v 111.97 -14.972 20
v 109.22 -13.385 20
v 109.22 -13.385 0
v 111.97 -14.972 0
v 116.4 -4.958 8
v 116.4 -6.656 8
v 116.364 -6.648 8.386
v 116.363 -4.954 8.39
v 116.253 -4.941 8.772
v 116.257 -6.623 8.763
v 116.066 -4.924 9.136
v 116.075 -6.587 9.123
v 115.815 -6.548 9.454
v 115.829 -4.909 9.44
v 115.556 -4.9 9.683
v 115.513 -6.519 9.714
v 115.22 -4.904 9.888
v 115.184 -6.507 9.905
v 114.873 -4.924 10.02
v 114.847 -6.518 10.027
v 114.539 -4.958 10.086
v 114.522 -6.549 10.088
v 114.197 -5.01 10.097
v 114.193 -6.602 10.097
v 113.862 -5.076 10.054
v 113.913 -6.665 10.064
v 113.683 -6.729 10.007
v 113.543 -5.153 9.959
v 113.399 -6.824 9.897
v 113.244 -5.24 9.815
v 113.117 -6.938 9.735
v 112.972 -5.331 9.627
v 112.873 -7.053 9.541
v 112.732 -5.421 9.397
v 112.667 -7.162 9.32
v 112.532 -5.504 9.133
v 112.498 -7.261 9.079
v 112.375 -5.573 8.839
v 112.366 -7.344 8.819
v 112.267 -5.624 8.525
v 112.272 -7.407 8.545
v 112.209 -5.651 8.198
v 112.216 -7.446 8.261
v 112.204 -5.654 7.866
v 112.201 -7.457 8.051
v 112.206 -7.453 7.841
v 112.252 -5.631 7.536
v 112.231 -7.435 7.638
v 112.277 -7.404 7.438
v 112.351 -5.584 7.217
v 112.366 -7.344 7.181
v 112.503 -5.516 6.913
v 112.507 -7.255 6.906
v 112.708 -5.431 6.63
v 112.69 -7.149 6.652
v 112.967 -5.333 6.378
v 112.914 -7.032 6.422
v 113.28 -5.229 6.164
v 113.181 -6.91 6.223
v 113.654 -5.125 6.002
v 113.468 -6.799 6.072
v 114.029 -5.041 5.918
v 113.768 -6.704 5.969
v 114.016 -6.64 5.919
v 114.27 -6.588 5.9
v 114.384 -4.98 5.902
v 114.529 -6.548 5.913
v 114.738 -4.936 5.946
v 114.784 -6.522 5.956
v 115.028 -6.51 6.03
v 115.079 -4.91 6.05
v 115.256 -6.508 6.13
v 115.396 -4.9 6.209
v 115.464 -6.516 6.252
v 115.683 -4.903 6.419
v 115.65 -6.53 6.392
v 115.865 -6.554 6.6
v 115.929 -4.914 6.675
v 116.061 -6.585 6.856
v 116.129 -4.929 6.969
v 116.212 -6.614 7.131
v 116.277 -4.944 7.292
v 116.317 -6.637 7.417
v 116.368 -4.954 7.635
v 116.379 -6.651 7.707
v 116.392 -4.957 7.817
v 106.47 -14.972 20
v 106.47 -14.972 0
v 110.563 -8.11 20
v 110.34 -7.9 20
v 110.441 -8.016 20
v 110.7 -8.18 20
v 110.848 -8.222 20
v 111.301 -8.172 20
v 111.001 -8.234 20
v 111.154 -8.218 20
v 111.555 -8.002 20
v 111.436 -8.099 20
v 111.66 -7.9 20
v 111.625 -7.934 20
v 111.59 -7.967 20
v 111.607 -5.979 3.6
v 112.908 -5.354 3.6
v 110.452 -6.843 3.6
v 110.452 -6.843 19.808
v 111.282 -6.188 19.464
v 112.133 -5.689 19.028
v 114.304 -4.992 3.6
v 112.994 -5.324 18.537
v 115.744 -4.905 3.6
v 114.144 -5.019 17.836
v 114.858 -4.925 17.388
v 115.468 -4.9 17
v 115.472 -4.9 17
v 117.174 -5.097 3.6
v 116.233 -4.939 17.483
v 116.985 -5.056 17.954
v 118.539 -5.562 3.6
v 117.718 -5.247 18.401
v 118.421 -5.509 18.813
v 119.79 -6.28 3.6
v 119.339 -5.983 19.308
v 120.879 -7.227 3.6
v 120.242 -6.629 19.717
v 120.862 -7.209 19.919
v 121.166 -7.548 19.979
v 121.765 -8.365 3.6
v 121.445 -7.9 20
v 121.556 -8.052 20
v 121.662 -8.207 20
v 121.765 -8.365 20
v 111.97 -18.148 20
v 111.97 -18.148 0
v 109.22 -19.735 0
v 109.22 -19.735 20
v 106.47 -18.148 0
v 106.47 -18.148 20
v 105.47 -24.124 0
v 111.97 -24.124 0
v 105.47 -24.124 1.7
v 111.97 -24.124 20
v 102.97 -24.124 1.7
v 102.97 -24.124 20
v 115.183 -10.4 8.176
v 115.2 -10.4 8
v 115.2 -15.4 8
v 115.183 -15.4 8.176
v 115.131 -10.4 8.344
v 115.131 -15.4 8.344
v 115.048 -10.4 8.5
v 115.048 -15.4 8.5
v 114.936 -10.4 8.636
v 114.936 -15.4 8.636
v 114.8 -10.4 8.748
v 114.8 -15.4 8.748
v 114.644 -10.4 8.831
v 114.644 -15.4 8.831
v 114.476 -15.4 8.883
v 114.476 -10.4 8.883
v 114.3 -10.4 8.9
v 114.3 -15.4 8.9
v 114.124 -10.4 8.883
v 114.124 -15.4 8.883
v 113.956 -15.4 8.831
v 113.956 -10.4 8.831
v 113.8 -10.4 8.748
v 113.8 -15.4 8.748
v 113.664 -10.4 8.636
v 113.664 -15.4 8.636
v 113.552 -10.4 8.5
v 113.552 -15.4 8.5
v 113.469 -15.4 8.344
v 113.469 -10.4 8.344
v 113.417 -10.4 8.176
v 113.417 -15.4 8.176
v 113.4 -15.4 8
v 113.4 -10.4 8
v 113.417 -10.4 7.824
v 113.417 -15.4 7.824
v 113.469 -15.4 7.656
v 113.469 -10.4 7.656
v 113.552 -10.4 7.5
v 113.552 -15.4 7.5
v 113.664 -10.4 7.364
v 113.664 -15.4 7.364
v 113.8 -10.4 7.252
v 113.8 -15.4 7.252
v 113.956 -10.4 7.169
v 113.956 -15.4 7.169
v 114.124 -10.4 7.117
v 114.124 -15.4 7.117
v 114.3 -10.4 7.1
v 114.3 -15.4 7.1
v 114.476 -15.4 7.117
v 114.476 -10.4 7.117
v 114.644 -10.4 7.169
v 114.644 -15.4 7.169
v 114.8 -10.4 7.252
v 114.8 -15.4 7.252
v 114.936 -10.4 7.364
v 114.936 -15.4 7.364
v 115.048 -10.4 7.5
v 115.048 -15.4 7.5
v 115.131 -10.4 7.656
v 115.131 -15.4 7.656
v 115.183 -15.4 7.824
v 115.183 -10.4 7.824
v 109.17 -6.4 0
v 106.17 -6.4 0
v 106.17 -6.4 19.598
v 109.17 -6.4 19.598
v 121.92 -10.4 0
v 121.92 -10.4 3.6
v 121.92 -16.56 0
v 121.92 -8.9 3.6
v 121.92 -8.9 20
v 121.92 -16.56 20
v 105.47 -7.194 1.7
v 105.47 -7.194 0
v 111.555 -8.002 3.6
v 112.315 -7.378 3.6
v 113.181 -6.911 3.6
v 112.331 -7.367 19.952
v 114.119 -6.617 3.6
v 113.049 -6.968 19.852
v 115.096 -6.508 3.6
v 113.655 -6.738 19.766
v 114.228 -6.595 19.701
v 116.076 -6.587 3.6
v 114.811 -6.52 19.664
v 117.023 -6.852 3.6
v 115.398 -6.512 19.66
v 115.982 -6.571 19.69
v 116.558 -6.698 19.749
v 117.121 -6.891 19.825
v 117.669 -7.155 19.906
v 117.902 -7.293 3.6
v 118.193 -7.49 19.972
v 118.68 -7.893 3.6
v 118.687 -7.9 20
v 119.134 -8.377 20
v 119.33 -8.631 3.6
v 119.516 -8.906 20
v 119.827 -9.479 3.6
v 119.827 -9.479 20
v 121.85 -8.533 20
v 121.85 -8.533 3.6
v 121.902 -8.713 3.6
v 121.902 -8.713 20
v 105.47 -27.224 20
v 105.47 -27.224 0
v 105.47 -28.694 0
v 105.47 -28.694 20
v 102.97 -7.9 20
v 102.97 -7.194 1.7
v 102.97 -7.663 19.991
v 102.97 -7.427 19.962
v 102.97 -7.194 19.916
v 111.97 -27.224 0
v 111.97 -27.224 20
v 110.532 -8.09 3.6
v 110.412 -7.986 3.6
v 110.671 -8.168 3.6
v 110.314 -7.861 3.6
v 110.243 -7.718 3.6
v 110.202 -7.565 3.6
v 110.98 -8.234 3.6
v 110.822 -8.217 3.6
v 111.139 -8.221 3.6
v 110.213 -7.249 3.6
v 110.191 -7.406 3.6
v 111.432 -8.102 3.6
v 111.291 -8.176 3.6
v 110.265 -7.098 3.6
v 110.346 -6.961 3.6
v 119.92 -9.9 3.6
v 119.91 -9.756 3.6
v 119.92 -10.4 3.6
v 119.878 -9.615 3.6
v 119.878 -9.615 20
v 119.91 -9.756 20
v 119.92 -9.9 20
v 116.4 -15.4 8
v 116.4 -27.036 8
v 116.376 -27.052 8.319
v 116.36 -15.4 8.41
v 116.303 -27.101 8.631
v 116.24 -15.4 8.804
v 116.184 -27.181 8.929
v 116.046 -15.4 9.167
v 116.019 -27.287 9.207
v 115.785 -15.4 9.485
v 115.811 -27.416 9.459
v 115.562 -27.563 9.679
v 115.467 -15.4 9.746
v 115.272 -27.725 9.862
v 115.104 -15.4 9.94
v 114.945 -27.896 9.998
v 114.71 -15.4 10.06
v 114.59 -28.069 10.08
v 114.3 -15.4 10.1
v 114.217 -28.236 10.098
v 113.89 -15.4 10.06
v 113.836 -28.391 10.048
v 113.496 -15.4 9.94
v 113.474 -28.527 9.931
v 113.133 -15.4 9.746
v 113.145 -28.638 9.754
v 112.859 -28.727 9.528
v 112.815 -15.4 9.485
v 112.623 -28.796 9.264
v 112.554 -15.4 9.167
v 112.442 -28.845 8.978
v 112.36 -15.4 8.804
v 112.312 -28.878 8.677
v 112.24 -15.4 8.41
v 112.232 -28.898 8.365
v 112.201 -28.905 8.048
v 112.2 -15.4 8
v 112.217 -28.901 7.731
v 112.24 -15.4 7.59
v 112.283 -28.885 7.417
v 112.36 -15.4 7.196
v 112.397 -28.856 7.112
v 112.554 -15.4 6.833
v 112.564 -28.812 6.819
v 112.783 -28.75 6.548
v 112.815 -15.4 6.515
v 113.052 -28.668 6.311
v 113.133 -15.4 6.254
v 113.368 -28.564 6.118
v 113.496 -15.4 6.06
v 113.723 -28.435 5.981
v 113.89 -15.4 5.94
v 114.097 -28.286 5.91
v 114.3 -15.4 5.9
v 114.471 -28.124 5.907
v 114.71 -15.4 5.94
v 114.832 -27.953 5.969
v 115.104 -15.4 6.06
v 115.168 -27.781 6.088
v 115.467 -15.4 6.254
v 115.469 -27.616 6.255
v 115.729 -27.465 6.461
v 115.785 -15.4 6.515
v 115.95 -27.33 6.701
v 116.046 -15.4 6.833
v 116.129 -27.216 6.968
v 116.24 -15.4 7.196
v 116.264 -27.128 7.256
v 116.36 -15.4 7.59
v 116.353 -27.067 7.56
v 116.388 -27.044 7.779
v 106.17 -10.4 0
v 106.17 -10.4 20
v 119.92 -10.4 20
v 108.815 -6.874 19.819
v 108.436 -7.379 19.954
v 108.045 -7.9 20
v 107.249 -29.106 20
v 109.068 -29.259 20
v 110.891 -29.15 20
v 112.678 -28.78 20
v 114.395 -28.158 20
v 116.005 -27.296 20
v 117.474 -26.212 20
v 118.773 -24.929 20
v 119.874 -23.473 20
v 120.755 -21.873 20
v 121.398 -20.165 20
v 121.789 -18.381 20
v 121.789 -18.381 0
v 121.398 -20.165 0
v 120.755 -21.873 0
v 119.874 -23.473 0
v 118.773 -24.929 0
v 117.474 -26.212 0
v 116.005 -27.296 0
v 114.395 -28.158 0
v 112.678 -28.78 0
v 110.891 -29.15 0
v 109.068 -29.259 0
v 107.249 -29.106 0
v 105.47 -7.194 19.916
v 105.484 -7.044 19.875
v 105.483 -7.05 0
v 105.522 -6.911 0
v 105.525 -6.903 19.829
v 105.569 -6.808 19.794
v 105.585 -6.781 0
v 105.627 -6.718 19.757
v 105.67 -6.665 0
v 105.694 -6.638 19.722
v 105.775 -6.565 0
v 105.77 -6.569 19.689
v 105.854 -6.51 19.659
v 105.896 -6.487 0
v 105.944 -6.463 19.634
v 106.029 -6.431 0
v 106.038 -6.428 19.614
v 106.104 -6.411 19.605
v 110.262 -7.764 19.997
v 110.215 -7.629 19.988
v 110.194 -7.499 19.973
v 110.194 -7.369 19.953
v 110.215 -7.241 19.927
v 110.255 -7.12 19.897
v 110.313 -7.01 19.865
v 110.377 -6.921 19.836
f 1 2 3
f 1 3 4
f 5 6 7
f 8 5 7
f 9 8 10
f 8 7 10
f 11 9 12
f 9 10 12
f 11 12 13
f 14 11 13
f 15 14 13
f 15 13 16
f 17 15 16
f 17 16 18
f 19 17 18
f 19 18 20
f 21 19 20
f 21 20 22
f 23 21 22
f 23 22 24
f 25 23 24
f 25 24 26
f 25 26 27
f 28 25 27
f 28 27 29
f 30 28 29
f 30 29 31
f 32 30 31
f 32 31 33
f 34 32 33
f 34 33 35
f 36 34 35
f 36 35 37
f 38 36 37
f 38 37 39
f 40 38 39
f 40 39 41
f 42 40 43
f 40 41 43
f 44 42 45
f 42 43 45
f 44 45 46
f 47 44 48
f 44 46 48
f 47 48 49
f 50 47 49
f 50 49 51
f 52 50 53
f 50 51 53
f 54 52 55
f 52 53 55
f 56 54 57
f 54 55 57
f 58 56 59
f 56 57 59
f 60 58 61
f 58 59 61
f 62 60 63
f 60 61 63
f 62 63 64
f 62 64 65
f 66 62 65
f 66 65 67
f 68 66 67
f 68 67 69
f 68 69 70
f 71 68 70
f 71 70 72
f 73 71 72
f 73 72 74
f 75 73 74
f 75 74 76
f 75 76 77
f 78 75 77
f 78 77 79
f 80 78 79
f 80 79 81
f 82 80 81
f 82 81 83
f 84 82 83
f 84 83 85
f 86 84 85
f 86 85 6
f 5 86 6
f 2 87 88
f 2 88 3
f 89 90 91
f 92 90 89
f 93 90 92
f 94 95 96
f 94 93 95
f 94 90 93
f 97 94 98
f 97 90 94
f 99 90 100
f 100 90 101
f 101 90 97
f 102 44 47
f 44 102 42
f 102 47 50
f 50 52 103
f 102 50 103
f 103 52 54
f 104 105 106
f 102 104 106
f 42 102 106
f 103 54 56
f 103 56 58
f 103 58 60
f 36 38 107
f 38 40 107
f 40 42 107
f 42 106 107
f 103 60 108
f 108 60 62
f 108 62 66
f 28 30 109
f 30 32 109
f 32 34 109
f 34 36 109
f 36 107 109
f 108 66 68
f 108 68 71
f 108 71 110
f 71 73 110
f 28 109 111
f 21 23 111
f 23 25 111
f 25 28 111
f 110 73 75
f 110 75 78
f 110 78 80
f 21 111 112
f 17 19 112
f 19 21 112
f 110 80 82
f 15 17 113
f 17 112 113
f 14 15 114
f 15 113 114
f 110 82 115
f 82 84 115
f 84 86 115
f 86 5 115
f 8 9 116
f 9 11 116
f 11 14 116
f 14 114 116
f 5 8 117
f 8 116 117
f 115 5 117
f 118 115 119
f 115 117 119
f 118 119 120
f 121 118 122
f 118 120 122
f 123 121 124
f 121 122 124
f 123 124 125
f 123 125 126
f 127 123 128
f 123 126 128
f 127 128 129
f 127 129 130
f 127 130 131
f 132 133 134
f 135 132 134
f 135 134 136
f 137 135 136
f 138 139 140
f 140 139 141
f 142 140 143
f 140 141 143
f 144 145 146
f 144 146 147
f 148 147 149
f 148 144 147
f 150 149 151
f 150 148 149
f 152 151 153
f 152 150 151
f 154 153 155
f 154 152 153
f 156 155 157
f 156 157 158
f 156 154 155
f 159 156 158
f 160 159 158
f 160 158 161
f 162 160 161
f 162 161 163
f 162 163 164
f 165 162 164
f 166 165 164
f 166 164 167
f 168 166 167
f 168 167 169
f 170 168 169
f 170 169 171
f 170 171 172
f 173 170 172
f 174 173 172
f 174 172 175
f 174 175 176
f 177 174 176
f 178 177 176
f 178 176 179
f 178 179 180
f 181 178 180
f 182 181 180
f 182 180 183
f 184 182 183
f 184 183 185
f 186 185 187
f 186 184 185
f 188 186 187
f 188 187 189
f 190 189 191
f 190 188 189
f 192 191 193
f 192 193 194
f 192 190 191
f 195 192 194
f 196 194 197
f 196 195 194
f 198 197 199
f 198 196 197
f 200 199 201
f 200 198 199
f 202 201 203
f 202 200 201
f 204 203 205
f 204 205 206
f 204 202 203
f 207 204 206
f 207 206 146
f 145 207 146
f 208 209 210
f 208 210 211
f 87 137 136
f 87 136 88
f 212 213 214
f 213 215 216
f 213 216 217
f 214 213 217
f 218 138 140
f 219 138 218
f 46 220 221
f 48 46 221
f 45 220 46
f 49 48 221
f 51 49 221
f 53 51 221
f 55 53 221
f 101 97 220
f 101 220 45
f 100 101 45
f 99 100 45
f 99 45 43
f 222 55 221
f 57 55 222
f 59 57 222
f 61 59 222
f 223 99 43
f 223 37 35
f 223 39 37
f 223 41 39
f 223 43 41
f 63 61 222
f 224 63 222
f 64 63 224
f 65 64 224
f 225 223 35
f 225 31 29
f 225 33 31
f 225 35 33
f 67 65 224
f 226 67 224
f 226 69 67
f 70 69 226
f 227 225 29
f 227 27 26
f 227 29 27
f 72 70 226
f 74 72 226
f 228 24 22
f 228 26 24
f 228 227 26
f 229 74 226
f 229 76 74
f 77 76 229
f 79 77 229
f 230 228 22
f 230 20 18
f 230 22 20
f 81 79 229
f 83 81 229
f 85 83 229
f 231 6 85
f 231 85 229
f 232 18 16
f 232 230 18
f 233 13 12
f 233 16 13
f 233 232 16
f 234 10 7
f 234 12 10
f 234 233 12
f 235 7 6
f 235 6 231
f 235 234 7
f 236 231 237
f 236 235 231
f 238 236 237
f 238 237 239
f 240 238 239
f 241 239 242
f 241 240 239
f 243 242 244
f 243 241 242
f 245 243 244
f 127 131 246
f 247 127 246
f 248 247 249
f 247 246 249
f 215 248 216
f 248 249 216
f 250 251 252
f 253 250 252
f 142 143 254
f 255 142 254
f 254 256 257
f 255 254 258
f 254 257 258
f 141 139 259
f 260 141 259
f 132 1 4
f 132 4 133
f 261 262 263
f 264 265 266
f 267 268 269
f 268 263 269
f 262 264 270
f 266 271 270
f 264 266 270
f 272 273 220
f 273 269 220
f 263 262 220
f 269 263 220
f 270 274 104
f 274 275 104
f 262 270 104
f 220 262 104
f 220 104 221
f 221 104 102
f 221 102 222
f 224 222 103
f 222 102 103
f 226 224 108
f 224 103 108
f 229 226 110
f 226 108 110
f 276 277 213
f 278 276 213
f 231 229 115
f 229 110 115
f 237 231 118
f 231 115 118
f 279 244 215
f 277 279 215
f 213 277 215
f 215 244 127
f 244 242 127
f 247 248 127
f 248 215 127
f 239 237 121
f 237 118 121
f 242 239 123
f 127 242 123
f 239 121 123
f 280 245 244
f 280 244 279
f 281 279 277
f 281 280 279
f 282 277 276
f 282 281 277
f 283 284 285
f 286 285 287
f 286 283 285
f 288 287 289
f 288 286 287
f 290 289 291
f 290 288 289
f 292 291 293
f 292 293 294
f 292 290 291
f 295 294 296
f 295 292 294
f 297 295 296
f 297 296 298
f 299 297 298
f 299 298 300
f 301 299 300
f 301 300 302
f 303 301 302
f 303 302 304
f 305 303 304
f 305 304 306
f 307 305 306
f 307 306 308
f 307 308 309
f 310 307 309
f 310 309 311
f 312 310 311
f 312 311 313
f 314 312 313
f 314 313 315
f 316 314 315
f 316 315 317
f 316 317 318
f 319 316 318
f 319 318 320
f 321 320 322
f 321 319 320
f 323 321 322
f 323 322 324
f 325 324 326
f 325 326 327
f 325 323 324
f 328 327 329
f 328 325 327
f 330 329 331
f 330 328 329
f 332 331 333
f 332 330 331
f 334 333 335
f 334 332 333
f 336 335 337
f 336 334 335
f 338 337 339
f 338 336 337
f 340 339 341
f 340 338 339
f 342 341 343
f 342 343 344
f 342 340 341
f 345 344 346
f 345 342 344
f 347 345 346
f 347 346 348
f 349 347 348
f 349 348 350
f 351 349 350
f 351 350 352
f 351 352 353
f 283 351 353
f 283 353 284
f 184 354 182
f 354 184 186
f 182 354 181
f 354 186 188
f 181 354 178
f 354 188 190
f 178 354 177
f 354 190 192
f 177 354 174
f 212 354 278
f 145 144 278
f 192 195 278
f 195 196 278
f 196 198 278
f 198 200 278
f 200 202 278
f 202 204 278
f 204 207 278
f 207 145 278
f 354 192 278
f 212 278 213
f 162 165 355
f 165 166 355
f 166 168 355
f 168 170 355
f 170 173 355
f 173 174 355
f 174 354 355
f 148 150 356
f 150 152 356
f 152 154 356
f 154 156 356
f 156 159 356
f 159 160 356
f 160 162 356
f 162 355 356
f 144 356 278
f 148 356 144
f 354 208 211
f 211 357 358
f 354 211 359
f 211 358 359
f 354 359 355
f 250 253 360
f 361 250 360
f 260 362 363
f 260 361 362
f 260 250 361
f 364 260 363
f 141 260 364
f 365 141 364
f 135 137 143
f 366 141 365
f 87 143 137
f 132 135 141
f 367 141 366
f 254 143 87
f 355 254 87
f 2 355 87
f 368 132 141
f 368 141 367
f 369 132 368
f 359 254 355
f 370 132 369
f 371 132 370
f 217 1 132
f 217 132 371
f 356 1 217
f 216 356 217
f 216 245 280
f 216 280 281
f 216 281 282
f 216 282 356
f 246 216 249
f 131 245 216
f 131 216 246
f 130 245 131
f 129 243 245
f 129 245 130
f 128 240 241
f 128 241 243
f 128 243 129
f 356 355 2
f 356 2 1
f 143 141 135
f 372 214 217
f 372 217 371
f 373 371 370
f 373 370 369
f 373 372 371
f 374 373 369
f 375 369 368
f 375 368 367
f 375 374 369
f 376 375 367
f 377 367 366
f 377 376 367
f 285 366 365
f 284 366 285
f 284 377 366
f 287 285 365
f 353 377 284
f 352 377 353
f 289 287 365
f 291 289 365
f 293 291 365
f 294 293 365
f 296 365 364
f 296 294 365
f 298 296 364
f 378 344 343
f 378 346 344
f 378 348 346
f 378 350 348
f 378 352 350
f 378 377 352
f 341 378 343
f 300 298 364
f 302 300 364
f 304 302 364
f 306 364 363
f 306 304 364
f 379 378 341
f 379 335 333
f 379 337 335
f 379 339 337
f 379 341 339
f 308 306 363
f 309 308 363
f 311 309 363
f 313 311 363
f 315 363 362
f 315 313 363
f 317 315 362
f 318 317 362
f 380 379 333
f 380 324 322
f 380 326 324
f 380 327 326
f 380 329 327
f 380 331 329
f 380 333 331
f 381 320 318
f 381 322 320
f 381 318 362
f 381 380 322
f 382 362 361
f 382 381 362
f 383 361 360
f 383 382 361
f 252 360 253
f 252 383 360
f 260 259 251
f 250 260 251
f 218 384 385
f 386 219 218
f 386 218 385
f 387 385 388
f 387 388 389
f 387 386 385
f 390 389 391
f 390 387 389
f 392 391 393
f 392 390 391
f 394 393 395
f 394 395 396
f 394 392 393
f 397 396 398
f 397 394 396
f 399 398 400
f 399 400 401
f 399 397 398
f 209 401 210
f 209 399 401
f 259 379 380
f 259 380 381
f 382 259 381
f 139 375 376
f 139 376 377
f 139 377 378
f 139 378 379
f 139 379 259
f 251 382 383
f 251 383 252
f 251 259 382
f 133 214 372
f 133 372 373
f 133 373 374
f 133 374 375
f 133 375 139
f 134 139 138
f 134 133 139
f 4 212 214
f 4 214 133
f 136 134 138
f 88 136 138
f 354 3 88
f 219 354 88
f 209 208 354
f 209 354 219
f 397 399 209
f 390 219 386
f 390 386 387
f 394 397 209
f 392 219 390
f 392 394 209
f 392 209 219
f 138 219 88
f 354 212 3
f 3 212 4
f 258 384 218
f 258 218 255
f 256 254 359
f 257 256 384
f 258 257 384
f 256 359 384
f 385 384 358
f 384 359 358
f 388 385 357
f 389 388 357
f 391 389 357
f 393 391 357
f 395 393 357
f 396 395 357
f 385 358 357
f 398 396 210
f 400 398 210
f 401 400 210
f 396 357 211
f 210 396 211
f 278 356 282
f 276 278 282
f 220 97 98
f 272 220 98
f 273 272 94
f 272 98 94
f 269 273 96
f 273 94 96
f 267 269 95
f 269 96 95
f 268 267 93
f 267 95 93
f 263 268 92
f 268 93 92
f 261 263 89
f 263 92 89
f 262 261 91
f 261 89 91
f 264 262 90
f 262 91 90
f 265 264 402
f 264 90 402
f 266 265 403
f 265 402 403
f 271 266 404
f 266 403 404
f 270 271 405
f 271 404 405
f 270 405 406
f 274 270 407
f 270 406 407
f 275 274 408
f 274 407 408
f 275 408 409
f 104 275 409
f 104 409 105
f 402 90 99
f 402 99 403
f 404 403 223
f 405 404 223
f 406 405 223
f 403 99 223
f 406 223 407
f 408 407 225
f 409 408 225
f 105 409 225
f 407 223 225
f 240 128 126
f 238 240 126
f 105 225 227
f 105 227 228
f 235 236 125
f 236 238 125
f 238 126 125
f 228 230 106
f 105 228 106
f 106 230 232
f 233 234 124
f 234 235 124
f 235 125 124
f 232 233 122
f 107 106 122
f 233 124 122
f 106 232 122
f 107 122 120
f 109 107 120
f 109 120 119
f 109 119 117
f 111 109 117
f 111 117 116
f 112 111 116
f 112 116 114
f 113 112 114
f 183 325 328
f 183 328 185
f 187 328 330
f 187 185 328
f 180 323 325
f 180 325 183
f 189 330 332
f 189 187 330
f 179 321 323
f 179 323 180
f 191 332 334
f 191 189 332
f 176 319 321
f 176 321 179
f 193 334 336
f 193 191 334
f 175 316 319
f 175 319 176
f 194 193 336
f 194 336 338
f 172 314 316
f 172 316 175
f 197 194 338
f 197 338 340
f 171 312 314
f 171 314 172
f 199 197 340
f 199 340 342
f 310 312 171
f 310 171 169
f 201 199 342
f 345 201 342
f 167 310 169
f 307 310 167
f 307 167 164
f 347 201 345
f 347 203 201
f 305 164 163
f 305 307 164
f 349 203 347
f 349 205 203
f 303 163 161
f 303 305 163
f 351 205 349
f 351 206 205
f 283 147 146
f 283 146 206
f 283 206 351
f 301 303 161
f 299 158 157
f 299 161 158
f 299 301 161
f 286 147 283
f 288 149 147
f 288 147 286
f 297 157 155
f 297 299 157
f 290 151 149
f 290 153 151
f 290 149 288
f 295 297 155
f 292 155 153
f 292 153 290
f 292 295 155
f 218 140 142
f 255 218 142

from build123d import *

# Parameters (mm, degrees)
SKETCH016_R     = 2.4
PAD017_DEPTH    = 20
SKETCH020_W     = 2.5
SKETCH020_H     = 16.93
PAD021_DEPTH    = 18.3
POCKET002_DEPTH = 20
POCKET004_DEPTH = 20.001
PAD029_DEPTH    = 16.4
POCKET013_DEPTH = 18.95102
SKETCH036_R     = 2.1
POCKET014_DEPTH = 13.861
SKETCH037_R     = 2.1
POCKET015_DEPTH = 5.501
SKETCH045_R     = 0.9
POCKET016_DEPTH = 18.861


with BuildPart() as corner_front_left:
    # Sketch016 → Pad017 (new body)
    with BuildSketch(Plane.XY):
        with BuildLine():
            ThreePointArc((-121.92, -35.56), (-116.758725, -45.780451), (-105.46998, -47.693728))
            Line((-105.46998, -46.223728), (-105.46998, -47.693728))
            Line((-111.96998, -46.223728), (-105.46998, -46.223728))
            Line((-111.96998, -43.123728), (-111.96998, -46.223728))
            Line((-105.46998, -43.123728), (-111.96998, -43.123728))
            Line((-105.46998, -31.693728), (-105.46998, -43.123728))
            Line((-105.46998, -31.693728), (-105.46998, -26.193728))
            ThreePointArc((-105.46998, -26.193728), (-105.669987, -25.66457), (-106.17, -25.4))
            Line((-106.17, -25.4), (-121.92, -25.4))
            Line((-121.92, -25.4), (-121.92, -35.56))
        make_face()
        with Locations((-109.22, -35.56)):
            Circle(SKETCH016_R, mode=Mode.SUBTRACT)
    extrude(amount=PAD017_DEPTH)

    # Sketch020 (on Face13 of Pad017) → Pad021 (join)
    with BuildSketch(Plane.XY.offset(20)):
        with Locations((-104.21998, -34.658728)):
            Rectangle(SKETCH020_W, SKETCH020_H)
    extrude(amount=-PAD021_DEPTH)

    # Sketch028 (on Face15 of Pad021) → Pocket002 (cut)
    with BuildSketch(Plane.XY.offset(20)):
        Polygon((-106.47, -37.147713), (-106.47, -33.972287), (-109.22, -32.384574), (-111.97, -33.972287), (-111.97, -37.147713), (-109.22, -38.735426), align=None)
    extrude(amount=-POCKET002_DEPTH, mode=Mode.SUBTRACT)

    # Sketch031 (on Face19 of Pocket002) → Pocket004 (cut, through all)
    with BuildSketch(Plane.XY.offset(20)):
        Polygon((-121.92, -25.4), (-109.17, -25.4), (-106.17, -29.4), (-121.92, -29.4), align=None)
    extrude(amount=-POCKET004_DEPTH, mode=Mode.SUBTRACT)

    # Sketch032 (on Face21 of Pocket004) → Pad029 (join)
    with BuildSketch(Plane.XY.offset(20)):
        with BuildLine():
            Line((-119.92, -29.4), (-119.92, -28.9))
            ThreePointArc((-119.827265, -28.47944), (-119.896541, -28.684669), (-119.92, -28.9))
            ThreePointArc((-111.555319, -27.001504), (-116.075974, -25.587421), (-119.827265, -28.47944))
            ThreePointArc((-111.555319, -27.001504), (-110.411621, -26.986272), (-110.452117, -25.843189))
            ThreePointArc((-110.452117, -25.843189), (-116.463348, -23.966517), (-121.764907, -27.365086))
            ThreePointArc((-121.764907, -27.365086), (-121.880444, -27.621528), (-121.92, -27.9))
            Line((-121.92, -27.9), (-121.92, -29.4))
            Line((-121.92, -29.4), (-121.92, -30.4))
            Line((-121.92, -30.4), (-119.92, -30.4))
            Line((-119.92, -30.4), (-119.92, -29.4))
        make_face()
    extrude(amount=-PAD029_DEPTH)

    # Sketch034 (on Plane of DatumPlane001) → Pocket013 (cut, through all)
    with BuildSketch(Plane(origin=(-121.92, 0, 0), x_dir=(0, -1, 0), z_dir=(-1, 0, 0))):
        with BuildLine():
            Line((26.9, 20), (26.9, 21))
            Line((26.9, 21), (22.9, 21))
            Line((22.9, 21), (22.9, 17))
            Line((22.9, 17), (23.9, 17))
            ThreePointArc((26.9, 20), (24.77868, 19.12132), (23.9, 17))
        make_face()
    extrude(amount=-POCKET013_DEPTH, mode=Mode.SUBTRACT)

    # Sketch036 (on Face8 of Pocket013) → Pocket014 (cut, through all)
    with BuildSketch(Plane(origin=(0, -34.4, 0), x_dir=(-1, 0, 0), z_dir=(0, 1, 0))):
        with Locations((114.3, 8)):
            Circle(SKETCH036_R)
    extrude(amount=-POCKET014_DEPTH, mode=Mode.SUBTRACT)

    # Sketch037 (on Face8 of Pocket014) → Pocket015 (cut, through all)
    with BuildSketch(Plane(origin=(0, -29.4, 0), x_dir=(-1, 0, 0), z_dir=(0, 1, 0))):
        with Locations((114.3, 8)):
            Circle(SKETCH037_R)
    extrude(amount=POCKET015_DEPTH, mode=Mode.SUBTRACT)

    # Sketch045 (on Face8 of Pocket015) → Pocket016 (cut, through all)
    with BuildSketch(Plane(origin=(0, -29.4, 0), x_dir=(-1, 0, 0), z_dir=(0, 1, 0))):
        with Locations((114.3, 8)):
            Circle(SKETCH045_R)
    extrude(amount=-POCKET016_DEPTH, mode=Mode.SUBTRACT)


with BuildPart() as corner_front_left_1:
    # Body012 placement: moved
    add(corner_front_left.part.moved(Location((0, 19, 0))))


with BuildPart() as corner_front_right_mirrored:
    # mirror: instance of Corner_front_left
    add(corner_front_left_1.part.mirror(Plane(origin=(1e-06, -17.077076, 10), x_dir=(0, -1, 0), z_dir=(1, 0, 0))))


solid = corner_front_right_mirrored.part
